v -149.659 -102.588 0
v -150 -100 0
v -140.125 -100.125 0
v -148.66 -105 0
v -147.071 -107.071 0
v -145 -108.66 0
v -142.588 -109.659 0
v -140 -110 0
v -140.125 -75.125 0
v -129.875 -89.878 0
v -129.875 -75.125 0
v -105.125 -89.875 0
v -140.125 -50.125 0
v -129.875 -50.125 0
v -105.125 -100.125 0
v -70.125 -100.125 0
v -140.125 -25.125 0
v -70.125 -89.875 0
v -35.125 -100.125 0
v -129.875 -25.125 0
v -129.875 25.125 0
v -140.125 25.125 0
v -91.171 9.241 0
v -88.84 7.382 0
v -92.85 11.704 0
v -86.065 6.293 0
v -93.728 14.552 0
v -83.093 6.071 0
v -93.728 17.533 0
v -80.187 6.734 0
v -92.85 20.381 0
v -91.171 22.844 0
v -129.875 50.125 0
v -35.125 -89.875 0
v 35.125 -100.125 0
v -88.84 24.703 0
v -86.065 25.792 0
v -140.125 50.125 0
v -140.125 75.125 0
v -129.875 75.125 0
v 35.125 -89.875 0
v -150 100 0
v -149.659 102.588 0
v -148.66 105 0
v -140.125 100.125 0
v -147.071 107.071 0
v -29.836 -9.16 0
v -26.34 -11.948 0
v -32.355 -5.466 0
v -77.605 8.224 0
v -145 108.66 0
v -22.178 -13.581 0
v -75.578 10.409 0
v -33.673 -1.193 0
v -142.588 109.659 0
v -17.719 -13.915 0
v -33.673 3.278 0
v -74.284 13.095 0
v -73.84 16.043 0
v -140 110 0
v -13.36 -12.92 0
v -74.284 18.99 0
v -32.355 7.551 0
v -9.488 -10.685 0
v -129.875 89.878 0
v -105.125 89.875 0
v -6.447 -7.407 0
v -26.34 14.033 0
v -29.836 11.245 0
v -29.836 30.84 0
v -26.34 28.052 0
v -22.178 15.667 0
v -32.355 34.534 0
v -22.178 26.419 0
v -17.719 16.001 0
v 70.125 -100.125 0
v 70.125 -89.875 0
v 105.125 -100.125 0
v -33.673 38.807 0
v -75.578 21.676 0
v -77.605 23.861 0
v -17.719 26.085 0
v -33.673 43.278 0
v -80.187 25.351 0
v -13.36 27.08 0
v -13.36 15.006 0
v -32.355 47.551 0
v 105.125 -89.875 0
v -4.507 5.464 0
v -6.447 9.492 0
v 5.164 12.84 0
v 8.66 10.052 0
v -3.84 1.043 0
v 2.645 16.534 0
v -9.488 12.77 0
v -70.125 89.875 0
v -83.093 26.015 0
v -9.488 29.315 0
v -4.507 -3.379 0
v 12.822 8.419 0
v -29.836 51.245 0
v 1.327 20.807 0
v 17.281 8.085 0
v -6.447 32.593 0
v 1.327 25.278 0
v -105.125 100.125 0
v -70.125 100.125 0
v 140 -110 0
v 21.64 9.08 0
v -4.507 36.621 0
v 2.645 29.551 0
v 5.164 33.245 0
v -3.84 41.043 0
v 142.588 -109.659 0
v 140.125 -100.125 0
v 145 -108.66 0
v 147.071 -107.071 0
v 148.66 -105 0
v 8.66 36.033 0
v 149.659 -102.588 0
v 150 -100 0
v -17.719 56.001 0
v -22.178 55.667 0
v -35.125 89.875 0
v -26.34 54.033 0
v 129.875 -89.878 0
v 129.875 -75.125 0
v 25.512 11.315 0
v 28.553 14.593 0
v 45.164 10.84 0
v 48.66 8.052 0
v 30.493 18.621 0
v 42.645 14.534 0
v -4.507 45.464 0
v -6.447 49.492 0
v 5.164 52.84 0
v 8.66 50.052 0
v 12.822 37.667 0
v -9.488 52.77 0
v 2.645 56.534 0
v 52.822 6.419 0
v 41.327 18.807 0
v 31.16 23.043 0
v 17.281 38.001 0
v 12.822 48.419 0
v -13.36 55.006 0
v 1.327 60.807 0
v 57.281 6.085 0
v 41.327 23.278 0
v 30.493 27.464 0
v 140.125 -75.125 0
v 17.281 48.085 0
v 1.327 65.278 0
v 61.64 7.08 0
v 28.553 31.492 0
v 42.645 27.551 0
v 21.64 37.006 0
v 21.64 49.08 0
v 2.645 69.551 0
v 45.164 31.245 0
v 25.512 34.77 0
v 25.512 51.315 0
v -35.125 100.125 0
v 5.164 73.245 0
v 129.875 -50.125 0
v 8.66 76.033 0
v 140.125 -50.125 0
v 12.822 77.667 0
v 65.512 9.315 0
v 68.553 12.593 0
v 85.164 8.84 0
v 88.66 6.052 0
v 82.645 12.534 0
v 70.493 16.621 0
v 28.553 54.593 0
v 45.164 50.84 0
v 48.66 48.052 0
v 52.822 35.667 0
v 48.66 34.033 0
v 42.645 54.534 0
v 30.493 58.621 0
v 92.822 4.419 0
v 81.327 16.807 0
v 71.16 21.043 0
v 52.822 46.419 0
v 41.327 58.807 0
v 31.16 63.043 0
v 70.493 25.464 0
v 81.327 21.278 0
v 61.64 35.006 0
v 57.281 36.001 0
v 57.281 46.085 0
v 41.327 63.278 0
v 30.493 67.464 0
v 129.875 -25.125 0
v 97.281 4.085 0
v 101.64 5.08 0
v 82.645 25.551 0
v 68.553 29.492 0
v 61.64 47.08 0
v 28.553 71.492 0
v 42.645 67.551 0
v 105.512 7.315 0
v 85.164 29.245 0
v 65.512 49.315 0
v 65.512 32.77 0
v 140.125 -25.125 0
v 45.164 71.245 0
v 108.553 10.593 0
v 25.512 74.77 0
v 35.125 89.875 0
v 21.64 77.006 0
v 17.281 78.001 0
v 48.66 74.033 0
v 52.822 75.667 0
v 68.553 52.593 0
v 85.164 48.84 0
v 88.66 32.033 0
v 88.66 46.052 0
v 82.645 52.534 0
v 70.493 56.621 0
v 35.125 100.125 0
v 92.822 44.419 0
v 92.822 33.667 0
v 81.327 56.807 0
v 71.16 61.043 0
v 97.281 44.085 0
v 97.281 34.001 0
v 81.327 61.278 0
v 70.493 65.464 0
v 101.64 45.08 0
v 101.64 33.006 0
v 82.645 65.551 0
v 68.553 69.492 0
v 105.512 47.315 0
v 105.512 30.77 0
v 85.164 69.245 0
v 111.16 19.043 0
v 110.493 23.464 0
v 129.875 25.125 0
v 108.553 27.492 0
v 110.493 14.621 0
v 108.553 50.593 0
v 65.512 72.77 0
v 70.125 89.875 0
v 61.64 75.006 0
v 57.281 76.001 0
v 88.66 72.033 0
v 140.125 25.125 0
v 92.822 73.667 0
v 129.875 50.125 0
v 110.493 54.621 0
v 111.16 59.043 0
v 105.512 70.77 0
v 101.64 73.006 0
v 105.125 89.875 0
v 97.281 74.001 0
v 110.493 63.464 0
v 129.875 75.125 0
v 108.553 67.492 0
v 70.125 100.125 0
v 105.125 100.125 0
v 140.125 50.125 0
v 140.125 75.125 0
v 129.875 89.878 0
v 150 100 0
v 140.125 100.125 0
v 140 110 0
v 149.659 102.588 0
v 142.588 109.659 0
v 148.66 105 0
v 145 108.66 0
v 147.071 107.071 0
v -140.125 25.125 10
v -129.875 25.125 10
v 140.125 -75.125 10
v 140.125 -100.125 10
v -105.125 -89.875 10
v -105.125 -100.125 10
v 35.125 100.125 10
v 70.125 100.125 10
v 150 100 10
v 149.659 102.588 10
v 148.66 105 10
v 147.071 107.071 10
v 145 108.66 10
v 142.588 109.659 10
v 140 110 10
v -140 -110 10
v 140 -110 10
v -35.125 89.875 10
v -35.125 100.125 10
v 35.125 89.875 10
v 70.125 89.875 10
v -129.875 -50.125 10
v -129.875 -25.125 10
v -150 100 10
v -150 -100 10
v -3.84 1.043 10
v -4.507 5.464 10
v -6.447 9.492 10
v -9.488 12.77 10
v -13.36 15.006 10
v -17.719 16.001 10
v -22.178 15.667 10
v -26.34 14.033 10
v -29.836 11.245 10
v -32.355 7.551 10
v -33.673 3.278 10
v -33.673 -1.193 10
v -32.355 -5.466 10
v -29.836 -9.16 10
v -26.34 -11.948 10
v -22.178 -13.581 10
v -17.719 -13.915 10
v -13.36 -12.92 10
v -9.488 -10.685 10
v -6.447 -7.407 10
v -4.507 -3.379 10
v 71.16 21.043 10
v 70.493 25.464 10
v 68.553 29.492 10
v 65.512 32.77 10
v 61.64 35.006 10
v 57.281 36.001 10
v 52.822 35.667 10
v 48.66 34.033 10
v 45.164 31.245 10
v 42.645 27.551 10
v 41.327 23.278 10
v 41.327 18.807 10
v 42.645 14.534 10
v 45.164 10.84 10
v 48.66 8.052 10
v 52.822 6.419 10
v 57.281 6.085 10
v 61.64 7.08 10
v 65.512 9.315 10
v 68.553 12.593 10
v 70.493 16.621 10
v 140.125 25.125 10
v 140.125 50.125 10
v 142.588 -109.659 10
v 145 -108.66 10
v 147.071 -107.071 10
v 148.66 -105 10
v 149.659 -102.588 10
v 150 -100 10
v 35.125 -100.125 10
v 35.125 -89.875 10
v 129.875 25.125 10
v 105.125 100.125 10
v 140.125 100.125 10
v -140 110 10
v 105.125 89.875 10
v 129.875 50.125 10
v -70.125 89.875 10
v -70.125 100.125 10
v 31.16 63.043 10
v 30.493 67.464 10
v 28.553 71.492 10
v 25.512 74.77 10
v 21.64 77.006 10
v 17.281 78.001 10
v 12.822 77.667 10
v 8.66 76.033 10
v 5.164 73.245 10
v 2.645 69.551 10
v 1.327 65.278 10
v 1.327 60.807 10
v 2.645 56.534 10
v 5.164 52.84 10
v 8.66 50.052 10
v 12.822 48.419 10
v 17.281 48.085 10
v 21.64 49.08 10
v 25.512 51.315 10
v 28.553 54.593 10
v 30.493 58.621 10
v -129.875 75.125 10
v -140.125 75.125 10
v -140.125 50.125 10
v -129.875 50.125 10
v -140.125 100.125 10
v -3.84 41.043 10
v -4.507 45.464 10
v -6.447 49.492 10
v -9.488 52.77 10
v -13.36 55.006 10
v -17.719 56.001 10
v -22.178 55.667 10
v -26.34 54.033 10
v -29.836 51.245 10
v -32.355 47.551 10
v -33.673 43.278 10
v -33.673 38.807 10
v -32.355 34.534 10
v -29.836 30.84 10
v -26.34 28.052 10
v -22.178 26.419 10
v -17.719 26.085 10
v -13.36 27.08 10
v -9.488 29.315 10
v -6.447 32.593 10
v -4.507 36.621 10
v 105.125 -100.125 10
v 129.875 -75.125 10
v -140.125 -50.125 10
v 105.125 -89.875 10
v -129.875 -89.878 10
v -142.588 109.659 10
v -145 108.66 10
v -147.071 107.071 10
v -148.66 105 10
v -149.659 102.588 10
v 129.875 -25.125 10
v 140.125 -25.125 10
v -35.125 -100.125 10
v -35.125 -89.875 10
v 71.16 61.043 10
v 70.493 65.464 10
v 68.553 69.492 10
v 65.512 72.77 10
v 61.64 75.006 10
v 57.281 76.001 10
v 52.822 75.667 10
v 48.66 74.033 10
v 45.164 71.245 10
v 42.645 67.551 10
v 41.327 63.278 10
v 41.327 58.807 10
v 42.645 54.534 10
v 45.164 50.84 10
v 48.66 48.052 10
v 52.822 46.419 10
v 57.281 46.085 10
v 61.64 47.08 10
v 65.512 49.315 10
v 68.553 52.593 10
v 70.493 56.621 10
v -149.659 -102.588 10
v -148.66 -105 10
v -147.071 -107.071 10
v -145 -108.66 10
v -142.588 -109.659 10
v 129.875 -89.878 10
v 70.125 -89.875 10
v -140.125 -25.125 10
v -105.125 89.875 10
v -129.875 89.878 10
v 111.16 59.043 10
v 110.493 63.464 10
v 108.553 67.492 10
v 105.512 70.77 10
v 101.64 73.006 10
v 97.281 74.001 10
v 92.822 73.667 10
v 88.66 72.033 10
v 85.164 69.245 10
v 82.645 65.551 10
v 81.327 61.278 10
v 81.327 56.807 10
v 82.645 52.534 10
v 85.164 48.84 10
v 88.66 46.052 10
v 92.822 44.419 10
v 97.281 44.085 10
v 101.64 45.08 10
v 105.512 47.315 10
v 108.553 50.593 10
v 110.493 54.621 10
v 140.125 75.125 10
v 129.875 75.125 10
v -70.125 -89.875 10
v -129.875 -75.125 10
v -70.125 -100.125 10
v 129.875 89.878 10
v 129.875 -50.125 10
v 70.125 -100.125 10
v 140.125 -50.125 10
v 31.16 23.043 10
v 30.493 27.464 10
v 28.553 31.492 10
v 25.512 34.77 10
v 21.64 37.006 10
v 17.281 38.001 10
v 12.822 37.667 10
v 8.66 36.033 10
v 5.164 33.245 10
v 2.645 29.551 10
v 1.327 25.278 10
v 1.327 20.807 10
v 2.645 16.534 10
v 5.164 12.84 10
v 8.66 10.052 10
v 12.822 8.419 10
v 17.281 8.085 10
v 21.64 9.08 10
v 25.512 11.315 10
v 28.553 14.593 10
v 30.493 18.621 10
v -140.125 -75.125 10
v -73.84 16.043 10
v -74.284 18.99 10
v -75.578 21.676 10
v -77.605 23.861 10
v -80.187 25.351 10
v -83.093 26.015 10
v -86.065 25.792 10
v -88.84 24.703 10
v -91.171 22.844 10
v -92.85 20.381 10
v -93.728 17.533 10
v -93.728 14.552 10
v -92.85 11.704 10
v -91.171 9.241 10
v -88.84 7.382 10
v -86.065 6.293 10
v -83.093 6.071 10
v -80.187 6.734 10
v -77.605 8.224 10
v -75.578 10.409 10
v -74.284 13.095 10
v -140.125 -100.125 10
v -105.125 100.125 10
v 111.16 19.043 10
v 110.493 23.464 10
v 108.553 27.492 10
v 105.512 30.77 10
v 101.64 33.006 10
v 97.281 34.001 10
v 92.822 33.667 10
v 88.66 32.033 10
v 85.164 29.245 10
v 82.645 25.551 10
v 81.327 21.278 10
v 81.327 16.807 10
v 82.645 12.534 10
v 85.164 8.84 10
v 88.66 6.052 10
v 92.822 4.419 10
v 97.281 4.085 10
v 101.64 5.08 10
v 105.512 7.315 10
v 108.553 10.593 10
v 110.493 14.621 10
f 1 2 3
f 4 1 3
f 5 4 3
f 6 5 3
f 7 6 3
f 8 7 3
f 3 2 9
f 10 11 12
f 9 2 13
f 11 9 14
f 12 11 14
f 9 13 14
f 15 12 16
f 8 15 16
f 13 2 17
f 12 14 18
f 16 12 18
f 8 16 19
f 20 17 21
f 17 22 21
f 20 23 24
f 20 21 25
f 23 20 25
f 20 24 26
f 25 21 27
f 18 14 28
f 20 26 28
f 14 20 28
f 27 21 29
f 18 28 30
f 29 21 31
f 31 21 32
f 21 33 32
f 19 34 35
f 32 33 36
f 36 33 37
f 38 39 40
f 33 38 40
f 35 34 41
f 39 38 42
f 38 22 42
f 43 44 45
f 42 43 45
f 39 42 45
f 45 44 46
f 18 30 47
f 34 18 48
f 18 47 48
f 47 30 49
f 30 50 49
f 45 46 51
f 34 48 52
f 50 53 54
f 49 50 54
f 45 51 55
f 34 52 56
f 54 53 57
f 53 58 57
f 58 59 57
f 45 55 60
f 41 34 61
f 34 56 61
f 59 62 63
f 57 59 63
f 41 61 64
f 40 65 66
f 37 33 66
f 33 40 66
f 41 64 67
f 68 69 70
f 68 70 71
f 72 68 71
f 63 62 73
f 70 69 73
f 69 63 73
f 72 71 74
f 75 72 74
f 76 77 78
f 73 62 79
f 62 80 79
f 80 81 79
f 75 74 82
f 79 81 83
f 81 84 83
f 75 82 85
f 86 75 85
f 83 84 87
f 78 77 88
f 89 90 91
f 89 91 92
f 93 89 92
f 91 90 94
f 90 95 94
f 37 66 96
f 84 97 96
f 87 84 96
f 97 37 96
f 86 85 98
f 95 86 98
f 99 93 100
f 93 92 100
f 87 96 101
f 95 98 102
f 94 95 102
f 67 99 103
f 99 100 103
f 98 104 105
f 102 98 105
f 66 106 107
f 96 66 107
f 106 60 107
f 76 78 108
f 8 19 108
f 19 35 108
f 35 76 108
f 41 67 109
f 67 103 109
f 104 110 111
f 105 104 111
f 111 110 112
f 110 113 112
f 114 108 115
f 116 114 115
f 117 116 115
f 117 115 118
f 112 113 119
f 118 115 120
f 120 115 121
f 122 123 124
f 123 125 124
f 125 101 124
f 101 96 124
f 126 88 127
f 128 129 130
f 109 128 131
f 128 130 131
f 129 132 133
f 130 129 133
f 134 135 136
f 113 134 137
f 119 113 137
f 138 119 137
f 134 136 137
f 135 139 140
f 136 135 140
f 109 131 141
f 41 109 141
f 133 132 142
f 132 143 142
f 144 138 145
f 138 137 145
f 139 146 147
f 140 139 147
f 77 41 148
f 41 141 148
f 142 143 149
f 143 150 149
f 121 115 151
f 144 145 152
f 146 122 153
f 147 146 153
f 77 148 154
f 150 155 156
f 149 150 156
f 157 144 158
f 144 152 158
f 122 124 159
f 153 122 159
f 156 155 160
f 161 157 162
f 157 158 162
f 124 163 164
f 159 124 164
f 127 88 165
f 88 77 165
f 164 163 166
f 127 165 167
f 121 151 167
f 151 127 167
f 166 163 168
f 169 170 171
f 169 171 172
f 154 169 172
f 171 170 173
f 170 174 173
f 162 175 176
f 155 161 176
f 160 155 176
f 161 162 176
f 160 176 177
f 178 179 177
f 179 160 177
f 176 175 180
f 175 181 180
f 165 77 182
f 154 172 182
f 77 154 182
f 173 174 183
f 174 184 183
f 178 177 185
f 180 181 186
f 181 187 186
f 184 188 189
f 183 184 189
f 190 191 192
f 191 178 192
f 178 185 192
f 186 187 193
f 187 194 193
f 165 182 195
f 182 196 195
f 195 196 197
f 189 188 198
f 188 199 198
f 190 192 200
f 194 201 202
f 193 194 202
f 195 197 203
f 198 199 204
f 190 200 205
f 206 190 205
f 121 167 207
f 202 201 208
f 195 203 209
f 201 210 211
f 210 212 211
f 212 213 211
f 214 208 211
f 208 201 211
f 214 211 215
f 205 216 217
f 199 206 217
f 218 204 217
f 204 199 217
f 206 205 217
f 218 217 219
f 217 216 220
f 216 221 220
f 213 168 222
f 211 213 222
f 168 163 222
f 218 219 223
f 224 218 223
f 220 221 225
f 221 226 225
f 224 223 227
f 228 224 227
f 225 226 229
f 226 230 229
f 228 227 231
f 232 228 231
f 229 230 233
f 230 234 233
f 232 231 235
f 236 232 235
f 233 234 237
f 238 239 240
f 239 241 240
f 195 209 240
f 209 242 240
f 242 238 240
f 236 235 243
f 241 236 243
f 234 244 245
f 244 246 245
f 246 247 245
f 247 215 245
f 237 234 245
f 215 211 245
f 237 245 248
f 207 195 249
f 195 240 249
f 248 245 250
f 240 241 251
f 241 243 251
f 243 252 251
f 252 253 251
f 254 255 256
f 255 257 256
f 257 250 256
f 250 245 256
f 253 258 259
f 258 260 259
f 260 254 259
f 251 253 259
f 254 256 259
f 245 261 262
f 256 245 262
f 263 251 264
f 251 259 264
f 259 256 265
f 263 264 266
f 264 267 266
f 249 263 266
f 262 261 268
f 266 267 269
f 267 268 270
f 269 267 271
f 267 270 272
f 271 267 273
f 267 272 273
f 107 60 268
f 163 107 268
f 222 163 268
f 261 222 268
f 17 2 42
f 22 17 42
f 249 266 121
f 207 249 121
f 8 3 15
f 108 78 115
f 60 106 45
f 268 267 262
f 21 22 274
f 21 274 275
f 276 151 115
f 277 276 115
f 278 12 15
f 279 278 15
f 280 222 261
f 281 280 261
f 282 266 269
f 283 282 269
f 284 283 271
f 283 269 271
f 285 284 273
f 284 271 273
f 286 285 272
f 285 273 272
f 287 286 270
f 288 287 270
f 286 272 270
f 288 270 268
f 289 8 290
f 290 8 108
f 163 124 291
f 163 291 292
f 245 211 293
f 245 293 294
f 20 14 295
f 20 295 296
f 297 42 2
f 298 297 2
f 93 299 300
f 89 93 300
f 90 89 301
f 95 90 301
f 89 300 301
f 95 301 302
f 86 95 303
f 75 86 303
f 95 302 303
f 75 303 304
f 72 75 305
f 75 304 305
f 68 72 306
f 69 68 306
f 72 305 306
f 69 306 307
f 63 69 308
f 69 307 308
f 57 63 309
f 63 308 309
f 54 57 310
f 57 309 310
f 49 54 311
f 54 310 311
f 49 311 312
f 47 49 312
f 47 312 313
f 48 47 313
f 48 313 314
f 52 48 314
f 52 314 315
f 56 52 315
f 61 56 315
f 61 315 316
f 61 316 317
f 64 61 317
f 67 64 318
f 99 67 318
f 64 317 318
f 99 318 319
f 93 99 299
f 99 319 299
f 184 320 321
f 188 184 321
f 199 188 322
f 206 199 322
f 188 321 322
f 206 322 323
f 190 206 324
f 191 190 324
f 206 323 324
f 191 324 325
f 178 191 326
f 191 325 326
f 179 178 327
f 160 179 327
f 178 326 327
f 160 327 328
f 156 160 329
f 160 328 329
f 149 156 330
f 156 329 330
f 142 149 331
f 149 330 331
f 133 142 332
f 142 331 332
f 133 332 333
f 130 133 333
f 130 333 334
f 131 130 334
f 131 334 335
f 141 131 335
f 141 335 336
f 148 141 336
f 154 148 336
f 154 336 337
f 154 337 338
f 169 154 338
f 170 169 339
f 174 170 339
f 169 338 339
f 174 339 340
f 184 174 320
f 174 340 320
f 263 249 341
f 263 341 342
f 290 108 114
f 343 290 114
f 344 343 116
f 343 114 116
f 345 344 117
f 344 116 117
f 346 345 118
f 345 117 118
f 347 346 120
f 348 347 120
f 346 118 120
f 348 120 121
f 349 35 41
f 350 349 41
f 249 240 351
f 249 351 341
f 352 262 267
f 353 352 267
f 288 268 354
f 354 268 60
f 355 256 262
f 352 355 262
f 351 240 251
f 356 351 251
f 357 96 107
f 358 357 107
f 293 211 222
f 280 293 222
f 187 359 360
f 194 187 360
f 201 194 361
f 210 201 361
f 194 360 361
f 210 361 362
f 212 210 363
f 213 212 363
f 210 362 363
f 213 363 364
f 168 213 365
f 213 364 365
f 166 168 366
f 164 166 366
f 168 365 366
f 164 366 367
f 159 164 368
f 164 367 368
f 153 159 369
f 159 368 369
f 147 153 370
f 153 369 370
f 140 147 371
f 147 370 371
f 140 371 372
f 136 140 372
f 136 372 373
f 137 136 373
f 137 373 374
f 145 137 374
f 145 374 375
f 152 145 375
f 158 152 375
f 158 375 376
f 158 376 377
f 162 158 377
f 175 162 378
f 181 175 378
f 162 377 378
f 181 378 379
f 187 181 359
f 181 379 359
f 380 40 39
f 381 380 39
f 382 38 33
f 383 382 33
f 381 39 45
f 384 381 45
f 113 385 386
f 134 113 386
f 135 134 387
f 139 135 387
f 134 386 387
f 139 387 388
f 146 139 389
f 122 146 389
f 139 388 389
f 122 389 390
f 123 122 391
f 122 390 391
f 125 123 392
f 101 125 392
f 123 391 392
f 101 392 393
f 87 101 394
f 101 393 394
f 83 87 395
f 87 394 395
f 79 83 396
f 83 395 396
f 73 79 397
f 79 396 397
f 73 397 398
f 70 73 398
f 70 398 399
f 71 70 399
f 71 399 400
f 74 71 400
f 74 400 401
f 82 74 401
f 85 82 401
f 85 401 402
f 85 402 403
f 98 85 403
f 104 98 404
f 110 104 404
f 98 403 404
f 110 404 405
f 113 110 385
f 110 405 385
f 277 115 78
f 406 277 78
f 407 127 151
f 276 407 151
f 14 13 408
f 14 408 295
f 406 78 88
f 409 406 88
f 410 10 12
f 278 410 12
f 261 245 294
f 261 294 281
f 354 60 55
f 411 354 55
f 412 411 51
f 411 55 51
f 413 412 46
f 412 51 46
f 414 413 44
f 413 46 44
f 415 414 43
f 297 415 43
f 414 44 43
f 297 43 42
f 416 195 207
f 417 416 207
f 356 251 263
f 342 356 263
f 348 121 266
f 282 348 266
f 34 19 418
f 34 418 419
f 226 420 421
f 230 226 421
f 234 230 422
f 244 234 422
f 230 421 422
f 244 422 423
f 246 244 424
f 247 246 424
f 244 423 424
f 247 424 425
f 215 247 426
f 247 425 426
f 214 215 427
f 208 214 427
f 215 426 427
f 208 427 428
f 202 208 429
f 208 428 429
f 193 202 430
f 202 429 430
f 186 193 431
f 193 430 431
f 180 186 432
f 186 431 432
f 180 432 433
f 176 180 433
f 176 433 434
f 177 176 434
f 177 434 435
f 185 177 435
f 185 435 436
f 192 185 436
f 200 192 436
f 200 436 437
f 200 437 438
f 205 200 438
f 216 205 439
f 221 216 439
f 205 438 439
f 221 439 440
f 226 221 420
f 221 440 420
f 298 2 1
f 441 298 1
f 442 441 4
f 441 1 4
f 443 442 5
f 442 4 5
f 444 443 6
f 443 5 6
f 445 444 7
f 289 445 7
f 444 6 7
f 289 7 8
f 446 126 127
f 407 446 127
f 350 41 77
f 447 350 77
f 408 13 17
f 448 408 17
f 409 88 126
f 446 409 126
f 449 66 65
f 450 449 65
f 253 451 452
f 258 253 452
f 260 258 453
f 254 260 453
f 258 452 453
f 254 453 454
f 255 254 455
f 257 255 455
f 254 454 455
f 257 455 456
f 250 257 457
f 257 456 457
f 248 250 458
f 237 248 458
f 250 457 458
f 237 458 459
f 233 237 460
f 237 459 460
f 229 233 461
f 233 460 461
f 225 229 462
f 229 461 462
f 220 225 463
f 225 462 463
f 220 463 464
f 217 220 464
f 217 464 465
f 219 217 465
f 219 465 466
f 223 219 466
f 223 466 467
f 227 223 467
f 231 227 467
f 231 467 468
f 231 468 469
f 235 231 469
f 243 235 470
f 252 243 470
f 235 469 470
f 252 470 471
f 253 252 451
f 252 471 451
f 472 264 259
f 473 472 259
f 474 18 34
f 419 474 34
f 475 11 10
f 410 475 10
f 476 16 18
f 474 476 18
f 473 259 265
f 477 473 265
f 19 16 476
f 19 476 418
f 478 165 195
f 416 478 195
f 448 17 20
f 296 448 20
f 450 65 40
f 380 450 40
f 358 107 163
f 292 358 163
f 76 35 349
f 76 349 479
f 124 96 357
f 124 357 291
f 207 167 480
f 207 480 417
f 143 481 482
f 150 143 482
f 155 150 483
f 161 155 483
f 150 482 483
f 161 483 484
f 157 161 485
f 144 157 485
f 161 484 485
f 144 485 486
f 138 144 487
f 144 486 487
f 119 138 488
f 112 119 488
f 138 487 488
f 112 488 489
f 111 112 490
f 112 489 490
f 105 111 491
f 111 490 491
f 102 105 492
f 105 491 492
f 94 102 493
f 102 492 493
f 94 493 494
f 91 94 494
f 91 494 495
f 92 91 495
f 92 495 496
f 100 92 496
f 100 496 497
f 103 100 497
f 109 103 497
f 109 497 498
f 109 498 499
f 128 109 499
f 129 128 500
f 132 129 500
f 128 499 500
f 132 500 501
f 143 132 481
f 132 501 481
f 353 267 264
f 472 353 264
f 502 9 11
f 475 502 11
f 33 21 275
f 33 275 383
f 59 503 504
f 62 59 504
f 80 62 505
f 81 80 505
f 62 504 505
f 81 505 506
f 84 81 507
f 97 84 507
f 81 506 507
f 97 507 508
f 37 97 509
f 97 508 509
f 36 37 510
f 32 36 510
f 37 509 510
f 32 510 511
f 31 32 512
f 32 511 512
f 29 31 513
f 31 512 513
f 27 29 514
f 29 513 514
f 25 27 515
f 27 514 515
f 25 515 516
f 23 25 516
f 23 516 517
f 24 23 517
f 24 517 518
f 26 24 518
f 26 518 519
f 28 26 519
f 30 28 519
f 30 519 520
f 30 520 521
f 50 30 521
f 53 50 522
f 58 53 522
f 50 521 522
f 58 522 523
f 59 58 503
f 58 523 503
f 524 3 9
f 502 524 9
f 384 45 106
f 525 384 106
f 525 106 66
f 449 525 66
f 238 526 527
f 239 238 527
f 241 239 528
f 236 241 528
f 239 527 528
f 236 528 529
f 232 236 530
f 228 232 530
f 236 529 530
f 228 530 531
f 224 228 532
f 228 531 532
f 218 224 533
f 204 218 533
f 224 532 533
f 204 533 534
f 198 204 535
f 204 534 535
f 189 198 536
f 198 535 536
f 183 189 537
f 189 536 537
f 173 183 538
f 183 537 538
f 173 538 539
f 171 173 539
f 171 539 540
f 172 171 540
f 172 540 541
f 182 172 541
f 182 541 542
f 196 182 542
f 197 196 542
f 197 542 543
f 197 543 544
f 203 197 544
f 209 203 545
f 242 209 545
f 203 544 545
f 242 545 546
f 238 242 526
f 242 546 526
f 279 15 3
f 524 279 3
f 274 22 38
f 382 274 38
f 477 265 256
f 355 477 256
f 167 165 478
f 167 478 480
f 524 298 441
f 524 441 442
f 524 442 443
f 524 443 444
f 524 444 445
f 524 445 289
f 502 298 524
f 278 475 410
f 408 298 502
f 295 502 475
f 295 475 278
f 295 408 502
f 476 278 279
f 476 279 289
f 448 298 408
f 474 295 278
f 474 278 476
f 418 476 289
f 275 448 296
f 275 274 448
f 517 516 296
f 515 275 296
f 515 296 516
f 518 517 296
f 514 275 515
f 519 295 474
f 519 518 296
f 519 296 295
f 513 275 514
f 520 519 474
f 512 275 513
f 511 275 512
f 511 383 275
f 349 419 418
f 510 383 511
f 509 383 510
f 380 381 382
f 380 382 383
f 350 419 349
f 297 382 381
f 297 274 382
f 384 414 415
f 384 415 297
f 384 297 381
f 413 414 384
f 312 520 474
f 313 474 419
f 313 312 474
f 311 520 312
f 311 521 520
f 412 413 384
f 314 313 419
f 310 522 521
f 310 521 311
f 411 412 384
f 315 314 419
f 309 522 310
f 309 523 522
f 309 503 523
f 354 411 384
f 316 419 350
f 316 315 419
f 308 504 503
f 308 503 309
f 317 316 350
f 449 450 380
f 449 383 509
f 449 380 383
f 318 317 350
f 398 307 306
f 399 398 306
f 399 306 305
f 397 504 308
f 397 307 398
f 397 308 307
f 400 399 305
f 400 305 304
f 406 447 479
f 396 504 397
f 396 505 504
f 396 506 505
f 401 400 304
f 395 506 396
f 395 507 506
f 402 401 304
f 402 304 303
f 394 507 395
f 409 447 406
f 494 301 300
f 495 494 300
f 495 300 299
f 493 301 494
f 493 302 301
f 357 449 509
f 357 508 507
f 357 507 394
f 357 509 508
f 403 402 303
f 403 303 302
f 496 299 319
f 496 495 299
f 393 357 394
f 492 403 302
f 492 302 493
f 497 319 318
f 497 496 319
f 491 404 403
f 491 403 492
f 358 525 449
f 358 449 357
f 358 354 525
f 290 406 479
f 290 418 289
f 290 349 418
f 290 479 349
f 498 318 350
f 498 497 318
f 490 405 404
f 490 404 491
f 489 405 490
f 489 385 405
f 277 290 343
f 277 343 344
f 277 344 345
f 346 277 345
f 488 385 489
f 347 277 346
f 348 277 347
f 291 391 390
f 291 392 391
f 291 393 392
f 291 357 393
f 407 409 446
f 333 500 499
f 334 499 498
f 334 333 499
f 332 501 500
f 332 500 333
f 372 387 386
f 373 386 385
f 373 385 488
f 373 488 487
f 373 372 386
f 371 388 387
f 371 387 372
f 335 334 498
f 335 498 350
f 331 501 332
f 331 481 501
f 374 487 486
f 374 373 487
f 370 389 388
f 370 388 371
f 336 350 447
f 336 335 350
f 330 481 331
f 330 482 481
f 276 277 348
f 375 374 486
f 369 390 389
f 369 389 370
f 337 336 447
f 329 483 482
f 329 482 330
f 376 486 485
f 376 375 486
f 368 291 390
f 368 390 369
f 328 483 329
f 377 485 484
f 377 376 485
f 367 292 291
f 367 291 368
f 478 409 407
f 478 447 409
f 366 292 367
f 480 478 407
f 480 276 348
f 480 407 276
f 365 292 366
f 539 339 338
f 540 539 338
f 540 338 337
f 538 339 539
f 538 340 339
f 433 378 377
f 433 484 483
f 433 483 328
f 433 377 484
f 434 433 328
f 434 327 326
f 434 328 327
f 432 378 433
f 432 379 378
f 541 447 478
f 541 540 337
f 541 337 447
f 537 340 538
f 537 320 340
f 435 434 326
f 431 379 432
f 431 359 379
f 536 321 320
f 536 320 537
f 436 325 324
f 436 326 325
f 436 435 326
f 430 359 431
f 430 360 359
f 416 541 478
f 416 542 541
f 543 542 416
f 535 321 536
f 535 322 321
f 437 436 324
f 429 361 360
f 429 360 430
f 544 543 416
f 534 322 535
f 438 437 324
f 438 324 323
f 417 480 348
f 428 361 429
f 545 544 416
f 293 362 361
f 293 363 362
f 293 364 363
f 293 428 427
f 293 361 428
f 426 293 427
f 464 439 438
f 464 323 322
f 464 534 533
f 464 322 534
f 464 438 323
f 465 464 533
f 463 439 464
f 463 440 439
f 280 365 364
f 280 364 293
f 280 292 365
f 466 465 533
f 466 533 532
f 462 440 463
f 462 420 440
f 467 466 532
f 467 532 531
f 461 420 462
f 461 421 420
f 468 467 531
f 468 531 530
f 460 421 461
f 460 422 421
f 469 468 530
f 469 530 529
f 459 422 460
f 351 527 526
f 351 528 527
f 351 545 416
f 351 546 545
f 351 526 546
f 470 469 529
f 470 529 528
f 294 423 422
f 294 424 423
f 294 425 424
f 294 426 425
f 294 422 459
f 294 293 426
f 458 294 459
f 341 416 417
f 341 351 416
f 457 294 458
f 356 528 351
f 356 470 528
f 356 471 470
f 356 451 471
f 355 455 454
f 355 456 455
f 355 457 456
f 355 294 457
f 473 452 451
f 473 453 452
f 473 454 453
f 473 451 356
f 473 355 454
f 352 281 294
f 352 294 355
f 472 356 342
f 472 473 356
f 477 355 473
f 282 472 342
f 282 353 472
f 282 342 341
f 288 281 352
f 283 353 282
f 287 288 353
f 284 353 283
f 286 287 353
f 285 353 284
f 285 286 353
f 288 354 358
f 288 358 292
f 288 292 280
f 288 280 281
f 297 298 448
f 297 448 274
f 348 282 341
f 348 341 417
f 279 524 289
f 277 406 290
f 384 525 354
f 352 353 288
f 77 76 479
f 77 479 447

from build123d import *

# Parameters (mm, degrees)
F0_W     = 35
F0_H     = 10.25
F0_W_2   = 10.25
F0_H_2   = 25
F1_DEPTH = 10
F2_R     = 10
F2_R_2   = 15
F3_DEPTH = 10


with BuildPart() as f1:
    # F0 (on Top) → F1 (new body)
    with BuildSketch(Plane.XY):
        with BuildLine():
            Line((140, 110), (-140, 110))
            ThreePointArc((-140, 110), (-147.071068, 107.071068), (-150, 100))
            Line((-150, 100), (-150, -100))
            ThreePointArc((-150, -100), (-147.071068, -107.071068), (-140, -110))
            Line((-140, -110), (140, -110))
            ThreePointArc((140, -110), (147.071068, -107.071068), (150, -100))
            Line((150, -100), (150, 100))
            ThreePointArc((150, 100), (147.071068, 107.071068), (140, 110))
        make_face()
        Polygon((-105.125, -100.125), (-140.125, -100.125), (-140.125, -75.125), (-129.875, -75.125), (-129.875, -89.878049), (-105.125, -89.875), align=None, mode=Mode.SUBTRACT)
        with Locations((-52.625, -95)):
            Rectangle(F0_W, F0_H, mode=Mode.SUBTRACT)
        with Locations((-135, -37.625)):
            Rectangle(F0_W_2, F0_H_2, mode=Mode.SUBTRACT)
        with Locations((52.625, -95)):
            Rectangle(F0_W, F0_H, mode=Mode.SUBTRACT)
        Polygon((129.875, -75.125), (140.125, -75.125), (140.125, -100.125), (105.125, -100.125), (105.125, -89.875), (129.875, -89.878049), align=None, mode=Mode.SUBTRACT)
        with Locations((135, -37.625)):
            Rectangle(F0_W_2, F0_H_2, mode=Mode.SUBTRACT)
        with Locations((-135, 37.625)):
            Rectangle(F0_W_2, F0_H_2, mode=Mode.SUBTRACT)
        Polygon((-129.875, 75.125), (-140.125, 75.125), (-140.125, 100.125), (-105.125, 100.125), (-105.125, 89.875), (-129.875, 89.878049), align=None, mode=Mode.SUBTRACT)
        with Locations((-52.625, 95)):
            Rectangle(F0_W, F0_H, mode=Mode.SUBTRACT)
        with Locations((135, 37.625)):
            Rectangle(F0_W_2, F0_H_2, mode=Mode.SUBTRACT)
        with Locations((52.625, 95)):
            Rectangle(F0_W, F0_H, mode=Mode.SUBTRACT)
        Polygon((105.125, 89.875), (105.125, 100.125), (140.125, 100.125), (140.125, 75.125), (129.875, 75.125), (129.875, 89.878049), align=None, mode=Mode.SUBTRACT)
    extrude(amount=F1_DEPTH)

    # F2 (on face) → F3 (cut)
    with BuildSketch(Plane.XY.offset(10)):
        with Locations((-83.84011, 16.042637)):
            Circle(F2_R)
        with Locations((-18.84011, 41.042637)):
            Circle(F2_R_2)
        with Locations((16.15989, 63.042637)):
            Circle(F2_R_2)
        with Locations((56.15989, 61.042637)):
            Circle(F2_R_2)
        with Locations((96.15989, 59.042637)):
            Circle(F2_R_2)
        with Locations((96.15989, 19.042637)):
            Circle(F2_R_2)
        with Locations((56.15989, 21.042637)):
            Circle(F2_R_2)
        with Locations((16.15989, 23.042637)):
            Circle(F2_R_2)
        with Locations((-18.84011, 1.042637)):
            Circle(F2_R_2)
    extrude(amount=-F3_DEPTH, mode=Mode.SUBTRACT)


solid = f1.part
